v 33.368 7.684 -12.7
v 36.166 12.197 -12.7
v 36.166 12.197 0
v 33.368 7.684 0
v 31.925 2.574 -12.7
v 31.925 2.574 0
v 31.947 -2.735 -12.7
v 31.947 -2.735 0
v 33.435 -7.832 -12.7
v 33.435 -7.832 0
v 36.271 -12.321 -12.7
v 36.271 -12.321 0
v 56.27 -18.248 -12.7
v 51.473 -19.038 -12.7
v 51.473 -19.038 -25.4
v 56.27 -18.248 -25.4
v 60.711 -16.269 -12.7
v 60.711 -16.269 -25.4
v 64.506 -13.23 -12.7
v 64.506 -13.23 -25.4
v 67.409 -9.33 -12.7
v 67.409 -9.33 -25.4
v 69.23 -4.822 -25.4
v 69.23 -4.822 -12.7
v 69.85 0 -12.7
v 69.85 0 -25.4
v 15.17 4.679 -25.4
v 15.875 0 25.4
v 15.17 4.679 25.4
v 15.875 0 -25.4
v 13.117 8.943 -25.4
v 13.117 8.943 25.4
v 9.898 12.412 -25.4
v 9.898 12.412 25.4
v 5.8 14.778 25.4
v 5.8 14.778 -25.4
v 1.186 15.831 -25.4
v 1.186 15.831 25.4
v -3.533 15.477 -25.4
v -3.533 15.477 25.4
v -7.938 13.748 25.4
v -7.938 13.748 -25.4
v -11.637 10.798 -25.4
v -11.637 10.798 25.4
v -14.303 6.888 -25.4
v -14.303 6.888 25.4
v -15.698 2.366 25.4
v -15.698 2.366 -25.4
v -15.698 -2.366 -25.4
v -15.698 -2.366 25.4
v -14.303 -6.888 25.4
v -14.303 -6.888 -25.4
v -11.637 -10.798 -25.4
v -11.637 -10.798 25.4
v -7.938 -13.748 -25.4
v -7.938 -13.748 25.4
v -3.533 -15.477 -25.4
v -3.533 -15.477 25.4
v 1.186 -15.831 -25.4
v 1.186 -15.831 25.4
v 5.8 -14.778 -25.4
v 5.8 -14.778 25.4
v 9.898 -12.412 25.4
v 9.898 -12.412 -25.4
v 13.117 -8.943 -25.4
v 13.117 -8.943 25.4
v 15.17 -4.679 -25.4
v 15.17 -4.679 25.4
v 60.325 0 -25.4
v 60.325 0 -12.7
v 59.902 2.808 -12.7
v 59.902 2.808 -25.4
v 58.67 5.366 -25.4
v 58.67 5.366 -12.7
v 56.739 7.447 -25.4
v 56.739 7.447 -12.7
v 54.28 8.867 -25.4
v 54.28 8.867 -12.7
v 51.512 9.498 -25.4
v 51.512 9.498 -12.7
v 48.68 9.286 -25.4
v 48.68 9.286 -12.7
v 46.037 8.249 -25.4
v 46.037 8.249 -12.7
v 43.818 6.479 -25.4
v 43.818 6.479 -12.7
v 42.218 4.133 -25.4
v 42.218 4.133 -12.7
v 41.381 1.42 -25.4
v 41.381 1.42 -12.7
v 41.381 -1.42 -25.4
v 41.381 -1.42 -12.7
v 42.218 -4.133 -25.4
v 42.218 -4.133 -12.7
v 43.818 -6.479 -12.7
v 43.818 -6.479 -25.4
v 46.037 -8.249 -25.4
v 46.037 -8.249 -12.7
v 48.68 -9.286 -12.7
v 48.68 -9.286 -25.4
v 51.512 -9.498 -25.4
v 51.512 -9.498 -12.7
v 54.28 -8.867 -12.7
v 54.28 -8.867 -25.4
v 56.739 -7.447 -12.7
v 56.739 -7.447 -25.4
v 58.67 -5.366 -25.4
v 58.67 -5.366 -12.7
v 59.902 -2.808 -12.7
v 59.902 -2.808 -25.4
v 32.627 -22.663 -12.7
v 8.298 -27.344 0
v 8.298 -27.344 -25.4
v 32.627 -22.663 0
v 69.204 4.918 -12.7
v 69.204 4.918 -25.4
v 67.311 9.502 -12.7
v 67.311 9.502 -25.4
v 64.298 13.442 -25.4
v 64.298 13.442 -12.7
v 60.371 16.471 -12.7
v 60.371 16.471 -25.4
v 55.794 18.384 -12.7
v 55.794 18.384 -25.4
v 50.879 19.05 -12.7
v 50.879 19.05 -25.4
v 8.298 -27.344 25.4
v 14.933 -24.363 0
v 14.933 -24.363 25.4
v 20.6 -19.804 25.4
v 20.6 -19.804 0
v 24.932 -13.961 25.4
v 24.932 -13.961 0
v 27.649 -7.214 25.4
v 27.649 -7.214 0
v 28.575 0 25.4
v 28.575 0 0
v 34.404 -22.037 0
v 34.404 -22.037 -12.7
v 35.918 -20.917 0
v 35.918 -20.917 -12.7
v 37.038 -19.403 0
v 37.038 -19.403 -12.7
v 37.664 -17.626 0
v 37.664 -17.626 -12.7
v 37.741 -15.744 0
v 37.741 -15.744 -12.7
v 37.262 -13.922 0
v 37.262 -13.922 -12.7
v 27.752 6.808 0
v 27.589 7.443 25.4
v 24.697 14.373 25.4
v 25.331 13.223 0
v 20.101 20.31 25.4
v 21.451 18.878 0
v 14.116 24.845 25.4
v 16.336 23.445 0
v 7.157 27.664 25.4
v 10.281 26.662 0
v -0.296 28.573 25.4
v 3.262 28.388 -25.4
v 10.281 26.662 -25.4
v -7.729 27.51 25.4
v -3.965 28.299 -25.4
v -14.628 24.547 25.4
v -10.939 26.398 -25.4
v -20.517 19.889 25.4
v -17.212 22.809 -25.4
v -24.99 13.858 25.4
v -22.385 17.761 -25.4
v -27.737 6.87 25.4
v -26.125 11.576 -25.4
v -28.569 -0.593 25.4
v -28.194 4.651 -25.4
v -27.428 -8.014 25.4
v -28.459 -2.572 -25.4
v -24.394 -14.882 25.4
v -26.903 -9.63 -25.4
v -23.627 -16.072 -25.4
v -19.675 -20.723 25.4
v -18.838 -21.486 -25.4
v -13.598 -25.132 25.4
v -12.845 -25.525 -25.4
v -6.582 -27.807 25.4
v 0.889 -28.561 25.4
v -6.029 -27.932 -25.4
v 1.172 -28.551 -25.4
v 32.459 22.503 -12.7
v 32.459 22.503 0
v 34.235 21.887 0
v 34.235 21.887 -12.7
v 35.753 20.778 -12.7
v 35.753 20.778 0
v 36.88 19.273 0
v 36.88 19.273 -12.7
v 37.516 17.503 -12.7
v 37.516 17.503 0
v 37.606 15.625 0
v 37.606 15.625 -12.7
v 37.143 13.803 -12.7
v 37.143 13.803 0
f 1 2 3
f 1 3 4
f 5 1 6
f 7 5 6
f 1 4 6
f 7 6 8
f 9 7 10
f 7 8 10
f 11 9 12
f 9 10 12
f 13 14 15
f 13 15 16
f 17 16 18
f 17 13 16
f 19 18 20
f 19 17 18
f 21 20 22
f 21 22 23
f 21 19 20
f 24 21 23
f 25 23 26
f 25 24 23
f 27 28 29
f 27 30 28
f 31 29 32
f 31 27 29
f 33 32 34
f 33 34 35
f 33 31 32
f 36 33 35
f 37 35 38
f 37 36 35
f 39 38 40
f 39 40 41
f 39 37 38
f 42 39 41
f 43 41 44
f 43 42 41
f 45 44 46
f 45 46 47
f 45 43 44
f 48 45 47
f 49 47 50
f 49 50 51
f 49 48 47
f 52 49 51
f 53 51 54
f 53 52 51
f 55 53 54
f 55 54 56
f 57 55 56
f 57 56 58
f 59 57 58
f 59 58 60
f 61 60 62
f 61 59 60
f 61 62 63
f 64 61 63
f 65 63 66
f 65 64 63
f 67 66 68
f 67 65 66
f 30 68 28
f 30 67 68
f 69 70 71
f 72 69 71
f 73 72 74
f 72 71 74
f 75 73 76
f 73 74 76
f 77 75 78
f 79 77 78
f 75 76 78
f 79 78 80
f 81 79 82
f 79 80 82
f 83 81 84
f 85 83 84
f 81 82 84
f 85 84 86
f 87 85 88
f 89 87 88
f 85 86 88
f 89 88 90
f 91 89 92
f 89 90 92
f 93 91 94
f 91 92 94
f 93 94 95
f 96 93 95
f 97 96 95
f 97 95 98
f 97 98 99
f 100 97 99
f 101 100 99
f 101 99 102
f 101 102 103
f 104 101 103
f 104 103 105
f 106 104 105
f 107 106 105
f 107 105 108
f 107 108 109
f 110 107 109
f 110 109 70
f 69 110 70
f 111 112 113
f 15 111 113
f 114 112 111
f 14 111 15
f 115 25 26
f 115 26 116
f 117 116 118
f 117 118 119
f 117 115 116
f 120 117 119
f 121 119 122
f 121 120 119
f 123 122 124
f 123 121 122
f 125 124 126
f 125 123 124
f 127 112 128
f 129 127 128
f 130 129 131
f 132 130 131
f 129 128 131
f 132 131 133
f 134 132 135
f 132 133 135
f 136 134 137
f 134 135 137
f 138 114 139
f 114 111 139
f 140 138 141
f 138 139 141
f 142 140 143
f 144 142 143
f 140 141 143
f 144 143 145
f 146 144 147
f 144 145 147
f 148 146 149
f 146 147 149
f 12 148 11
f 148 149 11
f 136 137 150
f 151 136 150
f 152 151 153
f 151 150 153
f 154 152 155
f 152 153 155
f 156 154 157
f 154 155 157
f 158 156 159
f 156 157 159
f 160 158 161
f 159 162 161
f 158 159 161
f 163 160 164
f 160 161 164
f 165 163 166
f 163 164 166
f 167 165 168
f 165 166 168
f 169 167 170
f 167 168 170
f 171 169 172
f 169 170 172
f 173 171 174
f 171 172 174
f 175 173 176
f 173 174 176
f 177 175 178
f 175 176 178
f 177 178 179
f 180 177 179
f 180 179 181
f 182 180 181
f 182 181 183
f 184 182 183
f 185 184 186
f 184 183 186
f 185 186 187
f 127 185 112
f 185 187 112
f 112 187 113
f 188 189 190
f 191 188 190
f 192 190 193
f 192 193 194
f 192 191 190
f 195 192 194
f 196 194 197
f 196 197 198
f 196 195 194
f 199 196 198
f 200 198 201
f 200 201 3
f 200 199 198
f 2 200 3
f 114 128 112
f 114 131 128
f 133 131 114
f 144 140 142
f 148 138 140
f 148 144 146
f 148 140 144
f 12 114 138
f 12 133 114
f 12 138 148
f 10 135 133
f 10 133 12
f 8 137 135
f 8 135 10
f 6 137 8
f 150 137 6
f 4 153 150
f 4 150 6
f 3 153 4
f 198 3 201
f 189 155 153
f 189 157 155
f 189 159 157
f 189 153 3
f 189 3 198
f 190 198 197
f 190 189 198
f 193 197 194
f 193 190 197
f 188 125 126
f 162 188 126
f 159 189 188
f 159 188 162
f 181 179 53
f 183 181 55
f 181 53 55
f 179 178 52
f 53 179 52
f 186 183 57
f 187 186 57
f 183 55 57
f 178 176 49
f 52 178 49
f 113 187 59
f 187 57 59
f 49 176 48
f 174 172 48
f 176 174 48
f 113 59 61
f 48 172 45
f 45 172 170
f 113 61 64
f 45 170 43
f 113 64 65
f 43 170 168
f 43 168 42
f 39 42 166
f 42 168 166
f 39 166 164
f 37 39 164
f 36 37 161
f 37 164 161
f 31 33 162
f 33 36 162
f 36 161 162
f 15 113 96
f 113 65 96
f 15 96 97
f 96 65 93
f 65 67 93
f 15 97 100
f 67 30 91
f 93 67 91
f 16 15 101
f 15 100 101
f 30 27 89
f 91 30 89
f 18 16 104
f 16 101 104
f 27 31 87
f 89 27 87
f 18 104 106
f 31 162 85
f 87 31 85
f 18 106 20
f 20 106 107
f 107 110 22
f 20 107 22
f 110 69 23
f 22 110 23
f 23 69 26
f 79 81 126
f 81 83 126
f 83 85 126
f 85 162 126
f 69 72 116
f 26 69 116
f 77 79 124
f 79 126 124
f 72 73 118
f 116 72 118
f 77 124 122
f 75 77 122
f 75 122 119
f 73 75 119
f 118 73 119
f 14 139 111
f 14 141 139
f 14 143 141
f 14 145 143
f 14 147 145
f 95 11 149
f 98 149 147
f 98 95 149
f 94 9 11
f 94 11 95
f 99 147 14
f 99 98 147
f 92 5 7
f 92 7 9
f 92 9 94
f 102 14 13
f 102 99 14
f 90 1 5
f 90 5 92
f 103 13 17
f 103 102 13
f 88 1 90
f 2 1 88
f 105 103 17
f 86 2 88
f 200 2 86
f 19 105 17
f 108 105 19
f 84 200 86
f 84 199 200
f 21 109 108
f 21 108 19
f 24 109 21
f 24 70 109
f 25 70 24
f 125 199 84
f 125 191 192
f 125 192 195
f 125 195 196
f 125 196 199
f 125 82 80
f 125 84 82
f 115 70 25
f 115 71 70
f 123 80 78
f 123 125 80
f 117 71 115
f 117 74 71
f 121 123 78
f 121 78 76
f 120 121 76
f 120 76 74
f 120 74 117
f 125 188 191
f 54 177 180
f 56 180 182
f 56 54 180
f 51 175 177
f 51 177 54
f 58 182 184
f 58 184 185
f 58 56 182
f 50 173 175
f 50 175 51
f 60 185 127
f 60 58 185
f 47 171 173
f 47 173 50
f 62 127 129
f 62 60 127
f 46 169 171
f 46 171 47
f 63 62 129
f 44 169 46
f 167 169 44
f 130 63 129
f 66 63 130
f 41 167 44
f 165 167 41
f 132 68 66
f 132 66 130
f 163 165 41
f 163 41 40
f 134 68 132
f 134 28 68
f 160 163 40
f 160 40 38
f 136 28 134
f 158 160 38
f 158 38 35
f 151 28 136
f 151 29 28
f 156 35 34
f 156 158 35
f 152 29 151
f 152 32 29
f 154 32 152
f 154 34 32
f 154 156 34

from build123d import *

# Parameters (mm, degrees)
F0_R     = 15.875
F0_R_2   = 9.525
F1_DEPTH = 25.4
F2_DEPTH = 25.4
F3_DEPTH = 12.7
F4_R     = 6.35


with BuildPart() as f1:
    # F0 (on Top) → F1 (new body)
    with BuildSketch(Plane.XY):
        with BuildLine():
            ThreePointArc((8.2981181618, -27.3435890105), (22.9526616264, -17.0207505493), (28.575, 0))
            ThreePointArc((28.575, 0), (23.5615881585, 16.16731853), (10.2805336167, 26.6616063574))
            ThreePointArc((10.2805336167, 26.6616063574), (-28.5557674937, 1.0482212761), (8.2981181618, -27.3435890105))
        make_face()
        Circle(F0_R, mode=Mode.SUBTRACT)
        with BuildLine():
            ThreePointArc((69.85, 0), (64.2983142533, 13.442396078), (50.8790800715, 19.0498358613))
            ThreePointArc((50.8790800715, 19.0498358613), (31.7523183533, -0.2971933484), (51.4733508184, -19.0380959835))
            ThreePointArc((51.4733508184, -19.0380959835), (64.5063823289, -13.2301770001), (69.85, 0))
        make_face()
        with Locations((50.8, 0)):
            Circle(F0_R_2, mode=Mode.SUBTRACT)
        with BuildLine():
            ThreePointArc((10.2805336167, 26.6616063574), (23.5615881585, 16.16731853), (28.575, 0))
            ThreePointArc((28.575, 0), (22.9526616264, -17.0207505493), (8.2981181618, -27.3435890105))
            Line((8.2981181618, -27.3435890105), (51.4733508184, -19.0380959835))
            ThreePointArc((51.4733508184, -19.0380959835), (31.7523183533, -0.2971933484), (50.8790800715, 19.0498358613))
            Line((50.8790800715, 19.0498358613), (10.2805336167, 26.6616063574))
        make_face()
    extrude(amount=-F1_DEPTH)

    # F0 (on Top) → F2 (join)
    with BuildSketch(Plane.XY):
        with BuildLine():
            ThreePointArc((8.2981181618, -27.3435890105), (22.9526616264, -17.0207505493), (28.575, 0))
            ThreePointArc((28.575, 0), (23.5615881585, 16.16731853), (10.2805336167, 26.6616063574))
            ThreePointArc((10.2805336167, 26.6616063574), (-28.5557674937, 1.0482212761), (8.2981181618, -27.3435890105))
        make_face()
        Circle(F0_R, mode=Mode.SUBTRACT)
    extrude(amount=F2_DEPTH)

    # F0 (on Top) → F3 (cut)
    with BuildSketch(Plane.XY):
        with BuildLine():
            ThreePointArc((69.85, 0), (64.2983142533, 13.442396078), (50.8790800715, 19.0498358613))
            ThreePointArc((50.8790800715, 19.0498358613), (31.7523183533, -0.2971933484), (51.4733508184, -19.0380959835))
            ThreePointArc((51.4733508184, -19.0380959835), (64.5063823289, -13.2301770001), (69.85, 0))
        make_face()
        with Locations((50.8, 0)):
            Circle(F0_R_2, mode=Mode.SUBTRACT)
    extrude(amount=-F3_DEPTH, mode=Mode.SUBTRACT)

    # F4
    f4_edges = [f1.edges().sort_by_distance(p)[0] for p in [
        (51.473351, -19.038096, -6.35),
        (50.87908, 19.049836, -6.35),
    ]]
    fillet(f4_edges, radius=F4_R)


solid = f1.part
